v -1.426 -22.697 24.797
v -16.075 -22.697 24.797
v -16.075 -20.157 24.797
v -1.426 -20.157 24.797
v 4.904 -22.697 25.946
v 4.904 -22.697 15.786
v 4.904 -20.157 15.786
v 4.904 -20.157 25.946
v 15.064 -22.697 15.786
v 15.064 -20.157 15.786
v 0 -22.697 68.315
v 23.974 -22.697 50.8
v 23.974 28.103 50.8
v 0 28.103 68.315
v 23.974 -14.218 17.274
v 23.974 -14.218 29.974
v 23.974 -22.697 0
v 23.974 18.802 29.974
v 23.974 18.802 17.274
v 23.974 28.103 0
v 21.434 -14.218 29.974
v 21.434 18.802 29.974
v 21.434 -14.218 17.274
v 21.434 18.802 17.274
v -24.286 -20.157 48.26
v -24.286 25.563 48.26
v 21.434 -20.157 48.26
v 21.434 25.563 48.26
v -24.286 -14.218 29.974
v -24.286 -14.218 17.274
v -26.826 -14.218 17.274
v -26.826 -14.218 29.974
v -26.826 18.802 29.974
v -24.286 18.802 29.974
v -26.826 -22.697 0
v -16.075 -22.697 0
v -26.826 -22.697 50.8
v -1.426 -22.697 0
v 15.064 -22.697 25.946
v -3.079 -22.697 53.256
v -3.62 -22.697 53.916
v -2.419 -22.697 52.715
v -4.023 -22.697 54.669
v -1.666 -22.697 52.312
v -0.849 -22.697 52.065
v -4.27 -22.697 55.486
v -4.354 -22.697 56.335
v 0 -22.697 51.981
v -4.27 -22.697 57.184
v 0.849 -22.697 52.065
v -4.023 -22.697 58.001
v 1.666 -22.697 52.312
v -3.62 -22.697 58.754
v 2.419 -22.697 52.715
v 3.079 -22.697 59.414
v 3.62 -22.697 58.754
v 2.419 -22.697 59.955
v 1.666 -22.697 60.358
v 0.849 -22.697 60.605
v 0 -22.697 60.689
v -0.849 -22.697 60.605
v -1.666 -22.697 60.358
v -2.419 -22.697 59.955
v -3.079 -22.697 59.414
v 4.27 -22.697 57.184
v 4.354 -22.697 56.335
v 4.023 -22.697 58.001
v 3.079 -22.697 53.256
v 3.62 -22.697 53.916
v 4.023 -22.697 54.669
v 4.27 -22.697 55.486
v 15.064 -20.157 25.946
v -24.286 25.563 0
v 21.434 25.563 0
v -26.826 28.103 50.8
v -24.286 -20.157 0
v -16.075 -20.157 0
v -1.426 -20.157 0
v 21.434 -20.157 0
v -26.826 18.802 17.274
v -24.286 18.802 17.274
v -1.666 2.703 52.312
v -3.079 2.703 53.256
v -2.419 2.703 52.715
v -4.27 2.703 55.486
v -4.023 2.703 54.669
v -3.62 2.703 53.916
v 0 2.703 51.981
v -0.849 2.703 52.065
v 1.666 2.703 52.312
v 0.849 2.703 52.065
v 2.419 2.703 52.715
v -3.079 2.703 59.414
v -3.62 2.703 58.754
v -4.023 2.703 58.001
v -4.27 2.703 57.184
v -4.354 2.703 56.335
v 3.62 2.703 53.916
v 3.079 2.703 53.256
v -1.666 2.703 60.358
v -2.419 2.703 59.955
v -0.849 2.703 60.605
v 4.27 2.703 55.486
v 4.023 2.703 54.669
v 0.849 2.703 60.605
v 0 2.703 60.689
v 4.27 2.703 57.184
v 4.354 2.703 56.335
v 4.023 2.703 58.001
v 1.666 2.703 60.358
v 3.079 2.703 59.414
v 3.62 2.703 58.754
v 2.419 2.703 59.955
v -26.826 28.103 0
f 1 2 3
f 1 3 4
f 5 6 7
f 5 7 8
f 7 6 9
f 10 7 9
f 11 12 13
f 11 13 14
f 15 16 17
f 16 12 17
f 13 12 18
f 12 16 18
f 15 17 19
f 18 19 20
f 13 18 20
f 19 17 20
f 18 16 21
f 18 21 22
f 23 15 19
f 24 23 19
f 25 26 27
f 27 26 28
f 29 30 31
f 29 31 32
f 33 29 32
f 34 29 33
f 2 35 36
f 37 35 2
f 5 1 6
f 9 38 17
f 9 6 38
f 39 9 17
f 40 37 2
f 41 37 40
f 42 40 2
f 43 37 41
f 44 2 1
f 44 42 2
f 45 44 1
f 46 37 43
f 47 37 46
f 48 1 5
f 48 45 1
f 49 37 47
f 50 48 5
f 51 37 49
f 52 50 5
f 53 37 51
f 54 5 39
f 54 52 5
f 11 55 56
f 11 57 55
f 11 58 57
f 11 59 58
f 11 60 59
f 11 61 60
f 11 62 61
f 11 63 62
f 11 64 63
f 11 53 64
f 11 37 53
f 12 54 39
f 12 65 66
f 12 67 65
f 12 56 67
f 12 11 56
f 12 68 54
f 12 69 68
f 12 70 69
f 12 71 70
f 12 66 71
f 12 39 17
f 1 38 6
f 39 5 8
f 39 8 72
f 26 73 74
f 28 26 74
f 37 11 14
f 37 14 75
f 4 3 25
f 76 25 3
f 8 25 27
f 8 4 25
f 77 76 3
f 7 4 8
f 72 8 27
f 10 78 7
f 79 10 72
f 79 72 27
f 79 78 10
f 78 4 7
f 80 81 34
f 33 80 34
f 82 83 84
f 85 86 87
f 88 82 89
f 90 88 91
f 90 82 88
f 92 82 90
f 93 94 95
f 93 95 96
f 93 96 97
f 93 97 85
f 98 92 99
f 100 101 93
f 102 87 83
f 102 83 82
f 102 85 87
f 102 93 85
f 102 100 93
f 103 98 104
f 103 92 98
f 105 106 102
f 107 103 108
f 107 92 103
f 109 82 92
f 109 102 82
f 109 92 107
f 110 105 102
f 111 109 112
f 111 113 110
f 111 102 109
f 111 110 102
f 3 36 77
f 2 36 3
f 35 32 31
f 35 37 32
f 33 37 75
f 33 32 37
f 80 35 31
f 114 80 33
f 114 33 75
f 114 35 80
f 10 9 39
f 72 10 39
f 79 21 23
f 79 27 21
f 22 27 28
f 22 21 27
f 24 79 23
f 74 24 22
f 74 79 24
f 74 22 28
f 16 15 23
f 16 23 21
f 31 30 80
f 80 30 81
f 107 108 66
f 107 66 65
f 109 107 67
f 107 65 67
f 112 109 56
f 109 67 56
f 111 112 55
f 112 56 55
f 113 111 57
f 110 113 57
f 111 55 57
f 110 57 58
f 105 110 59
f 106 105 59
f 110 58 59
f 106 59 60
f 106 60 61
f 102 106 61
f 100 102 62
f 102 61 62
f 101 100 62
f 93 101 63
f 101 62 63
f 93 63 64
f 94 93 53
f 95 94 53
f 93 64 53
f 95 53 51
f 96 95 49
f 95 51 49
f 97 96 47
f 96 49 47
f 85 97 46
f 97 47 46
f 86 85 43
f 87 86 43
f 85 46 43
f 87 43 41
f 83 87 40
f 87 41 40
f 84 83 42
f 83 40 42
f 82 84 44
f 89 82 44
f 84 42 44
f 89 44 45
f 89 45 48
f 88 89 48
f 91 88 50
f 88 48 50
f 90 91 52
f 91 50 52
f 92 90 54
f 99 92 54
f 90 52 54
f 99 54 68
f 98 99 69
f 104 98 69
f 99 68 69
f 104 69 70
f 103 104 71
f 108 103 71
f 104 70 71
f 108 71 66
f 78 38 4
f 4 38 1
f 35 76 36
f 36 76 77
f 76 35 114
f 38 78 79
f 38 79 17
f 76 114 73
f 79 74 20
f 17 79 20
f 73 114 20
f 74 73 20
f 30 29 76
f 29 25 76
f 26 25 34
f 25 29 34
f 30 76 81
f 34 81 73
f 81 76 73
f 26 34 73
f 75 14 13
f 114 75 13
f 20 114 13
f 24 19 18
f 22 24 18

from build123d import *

# Parameters (mm, degrees)
F0_W      = 50.8
F0_H      = 50.8
F1_DEPTH  = 50.8
F2_T      = -2.54
F3_W      = 14.649291
F3_H      = 24.7973
F3_W_2    = 10.16
F3_H_2    = 10.16
F4_DEPTH  = 22.352
F6_DEPTH  = 50.8
F7_W      = 33.02
F7_H      = 12.7
F8_DEPTH  = 84.836
F9_R      = 4.354014
F10_DEPTH = 25.4


with BuildPart() as f1:
    # F0 (on Top) → F1 (new body)
    with BuildSketch(Plane.XY):
        with Locations((-1.426203, 2.702715)):
            Rectangle(F0_W, F0_H)
    extrude(amount=F1_DEPTH)

    # F2
    f2_openings = [f1.faces().sort_by_distance(p)[0] for p in [
        (-1.426203, 2.702715, 0),
    ]]
    offset(amount=F2_T, openings=f2_openings)

    # F3 (on face) → F4 (cut)
    with BuildSketch(Plane.XZ.offset(22.697285)):
        with Locations((-8.750849, 12.39865)):
            Rectangle(F3_W, F3_H)
        with Locations((9.98387, 20.866262)):
            Rectangle(F3_W_2, F3_H_2)
    extrude(amount=-F4_DEPTH, mode=Mode.SUBTRACT)

    # F5 (on face) → F6 (join)
    with BuildSketch(Plane.XZ.offset(22.697285)):
        Polygon((0, 68.315133), (-26.826203, 50.8), (23.973797, 50.8), align=None)
    extrude(amount=-F6_DEPTH)

    # F7 (on face) → F8 (cut)
    with BuildSketch(Plane.YZ.offset(23.973797)):
        with Locations((2.292057, 23.624347)):
            Rectangle(F7_W, F7_H)
    extrude(amount=-F8_DEPTH, mode=Mode.SUBTRACT)

    # F9 (on face) → F10 (cut)
    with BuildSketch(Plane.XZ.offset(22.697285)):
        with Locations((0, 56.335028)):
            Circle(F9_R)
    extrude(amount=-F10_DEPTH, mode=Mode.SUBTRACT)


solid = f1.part
